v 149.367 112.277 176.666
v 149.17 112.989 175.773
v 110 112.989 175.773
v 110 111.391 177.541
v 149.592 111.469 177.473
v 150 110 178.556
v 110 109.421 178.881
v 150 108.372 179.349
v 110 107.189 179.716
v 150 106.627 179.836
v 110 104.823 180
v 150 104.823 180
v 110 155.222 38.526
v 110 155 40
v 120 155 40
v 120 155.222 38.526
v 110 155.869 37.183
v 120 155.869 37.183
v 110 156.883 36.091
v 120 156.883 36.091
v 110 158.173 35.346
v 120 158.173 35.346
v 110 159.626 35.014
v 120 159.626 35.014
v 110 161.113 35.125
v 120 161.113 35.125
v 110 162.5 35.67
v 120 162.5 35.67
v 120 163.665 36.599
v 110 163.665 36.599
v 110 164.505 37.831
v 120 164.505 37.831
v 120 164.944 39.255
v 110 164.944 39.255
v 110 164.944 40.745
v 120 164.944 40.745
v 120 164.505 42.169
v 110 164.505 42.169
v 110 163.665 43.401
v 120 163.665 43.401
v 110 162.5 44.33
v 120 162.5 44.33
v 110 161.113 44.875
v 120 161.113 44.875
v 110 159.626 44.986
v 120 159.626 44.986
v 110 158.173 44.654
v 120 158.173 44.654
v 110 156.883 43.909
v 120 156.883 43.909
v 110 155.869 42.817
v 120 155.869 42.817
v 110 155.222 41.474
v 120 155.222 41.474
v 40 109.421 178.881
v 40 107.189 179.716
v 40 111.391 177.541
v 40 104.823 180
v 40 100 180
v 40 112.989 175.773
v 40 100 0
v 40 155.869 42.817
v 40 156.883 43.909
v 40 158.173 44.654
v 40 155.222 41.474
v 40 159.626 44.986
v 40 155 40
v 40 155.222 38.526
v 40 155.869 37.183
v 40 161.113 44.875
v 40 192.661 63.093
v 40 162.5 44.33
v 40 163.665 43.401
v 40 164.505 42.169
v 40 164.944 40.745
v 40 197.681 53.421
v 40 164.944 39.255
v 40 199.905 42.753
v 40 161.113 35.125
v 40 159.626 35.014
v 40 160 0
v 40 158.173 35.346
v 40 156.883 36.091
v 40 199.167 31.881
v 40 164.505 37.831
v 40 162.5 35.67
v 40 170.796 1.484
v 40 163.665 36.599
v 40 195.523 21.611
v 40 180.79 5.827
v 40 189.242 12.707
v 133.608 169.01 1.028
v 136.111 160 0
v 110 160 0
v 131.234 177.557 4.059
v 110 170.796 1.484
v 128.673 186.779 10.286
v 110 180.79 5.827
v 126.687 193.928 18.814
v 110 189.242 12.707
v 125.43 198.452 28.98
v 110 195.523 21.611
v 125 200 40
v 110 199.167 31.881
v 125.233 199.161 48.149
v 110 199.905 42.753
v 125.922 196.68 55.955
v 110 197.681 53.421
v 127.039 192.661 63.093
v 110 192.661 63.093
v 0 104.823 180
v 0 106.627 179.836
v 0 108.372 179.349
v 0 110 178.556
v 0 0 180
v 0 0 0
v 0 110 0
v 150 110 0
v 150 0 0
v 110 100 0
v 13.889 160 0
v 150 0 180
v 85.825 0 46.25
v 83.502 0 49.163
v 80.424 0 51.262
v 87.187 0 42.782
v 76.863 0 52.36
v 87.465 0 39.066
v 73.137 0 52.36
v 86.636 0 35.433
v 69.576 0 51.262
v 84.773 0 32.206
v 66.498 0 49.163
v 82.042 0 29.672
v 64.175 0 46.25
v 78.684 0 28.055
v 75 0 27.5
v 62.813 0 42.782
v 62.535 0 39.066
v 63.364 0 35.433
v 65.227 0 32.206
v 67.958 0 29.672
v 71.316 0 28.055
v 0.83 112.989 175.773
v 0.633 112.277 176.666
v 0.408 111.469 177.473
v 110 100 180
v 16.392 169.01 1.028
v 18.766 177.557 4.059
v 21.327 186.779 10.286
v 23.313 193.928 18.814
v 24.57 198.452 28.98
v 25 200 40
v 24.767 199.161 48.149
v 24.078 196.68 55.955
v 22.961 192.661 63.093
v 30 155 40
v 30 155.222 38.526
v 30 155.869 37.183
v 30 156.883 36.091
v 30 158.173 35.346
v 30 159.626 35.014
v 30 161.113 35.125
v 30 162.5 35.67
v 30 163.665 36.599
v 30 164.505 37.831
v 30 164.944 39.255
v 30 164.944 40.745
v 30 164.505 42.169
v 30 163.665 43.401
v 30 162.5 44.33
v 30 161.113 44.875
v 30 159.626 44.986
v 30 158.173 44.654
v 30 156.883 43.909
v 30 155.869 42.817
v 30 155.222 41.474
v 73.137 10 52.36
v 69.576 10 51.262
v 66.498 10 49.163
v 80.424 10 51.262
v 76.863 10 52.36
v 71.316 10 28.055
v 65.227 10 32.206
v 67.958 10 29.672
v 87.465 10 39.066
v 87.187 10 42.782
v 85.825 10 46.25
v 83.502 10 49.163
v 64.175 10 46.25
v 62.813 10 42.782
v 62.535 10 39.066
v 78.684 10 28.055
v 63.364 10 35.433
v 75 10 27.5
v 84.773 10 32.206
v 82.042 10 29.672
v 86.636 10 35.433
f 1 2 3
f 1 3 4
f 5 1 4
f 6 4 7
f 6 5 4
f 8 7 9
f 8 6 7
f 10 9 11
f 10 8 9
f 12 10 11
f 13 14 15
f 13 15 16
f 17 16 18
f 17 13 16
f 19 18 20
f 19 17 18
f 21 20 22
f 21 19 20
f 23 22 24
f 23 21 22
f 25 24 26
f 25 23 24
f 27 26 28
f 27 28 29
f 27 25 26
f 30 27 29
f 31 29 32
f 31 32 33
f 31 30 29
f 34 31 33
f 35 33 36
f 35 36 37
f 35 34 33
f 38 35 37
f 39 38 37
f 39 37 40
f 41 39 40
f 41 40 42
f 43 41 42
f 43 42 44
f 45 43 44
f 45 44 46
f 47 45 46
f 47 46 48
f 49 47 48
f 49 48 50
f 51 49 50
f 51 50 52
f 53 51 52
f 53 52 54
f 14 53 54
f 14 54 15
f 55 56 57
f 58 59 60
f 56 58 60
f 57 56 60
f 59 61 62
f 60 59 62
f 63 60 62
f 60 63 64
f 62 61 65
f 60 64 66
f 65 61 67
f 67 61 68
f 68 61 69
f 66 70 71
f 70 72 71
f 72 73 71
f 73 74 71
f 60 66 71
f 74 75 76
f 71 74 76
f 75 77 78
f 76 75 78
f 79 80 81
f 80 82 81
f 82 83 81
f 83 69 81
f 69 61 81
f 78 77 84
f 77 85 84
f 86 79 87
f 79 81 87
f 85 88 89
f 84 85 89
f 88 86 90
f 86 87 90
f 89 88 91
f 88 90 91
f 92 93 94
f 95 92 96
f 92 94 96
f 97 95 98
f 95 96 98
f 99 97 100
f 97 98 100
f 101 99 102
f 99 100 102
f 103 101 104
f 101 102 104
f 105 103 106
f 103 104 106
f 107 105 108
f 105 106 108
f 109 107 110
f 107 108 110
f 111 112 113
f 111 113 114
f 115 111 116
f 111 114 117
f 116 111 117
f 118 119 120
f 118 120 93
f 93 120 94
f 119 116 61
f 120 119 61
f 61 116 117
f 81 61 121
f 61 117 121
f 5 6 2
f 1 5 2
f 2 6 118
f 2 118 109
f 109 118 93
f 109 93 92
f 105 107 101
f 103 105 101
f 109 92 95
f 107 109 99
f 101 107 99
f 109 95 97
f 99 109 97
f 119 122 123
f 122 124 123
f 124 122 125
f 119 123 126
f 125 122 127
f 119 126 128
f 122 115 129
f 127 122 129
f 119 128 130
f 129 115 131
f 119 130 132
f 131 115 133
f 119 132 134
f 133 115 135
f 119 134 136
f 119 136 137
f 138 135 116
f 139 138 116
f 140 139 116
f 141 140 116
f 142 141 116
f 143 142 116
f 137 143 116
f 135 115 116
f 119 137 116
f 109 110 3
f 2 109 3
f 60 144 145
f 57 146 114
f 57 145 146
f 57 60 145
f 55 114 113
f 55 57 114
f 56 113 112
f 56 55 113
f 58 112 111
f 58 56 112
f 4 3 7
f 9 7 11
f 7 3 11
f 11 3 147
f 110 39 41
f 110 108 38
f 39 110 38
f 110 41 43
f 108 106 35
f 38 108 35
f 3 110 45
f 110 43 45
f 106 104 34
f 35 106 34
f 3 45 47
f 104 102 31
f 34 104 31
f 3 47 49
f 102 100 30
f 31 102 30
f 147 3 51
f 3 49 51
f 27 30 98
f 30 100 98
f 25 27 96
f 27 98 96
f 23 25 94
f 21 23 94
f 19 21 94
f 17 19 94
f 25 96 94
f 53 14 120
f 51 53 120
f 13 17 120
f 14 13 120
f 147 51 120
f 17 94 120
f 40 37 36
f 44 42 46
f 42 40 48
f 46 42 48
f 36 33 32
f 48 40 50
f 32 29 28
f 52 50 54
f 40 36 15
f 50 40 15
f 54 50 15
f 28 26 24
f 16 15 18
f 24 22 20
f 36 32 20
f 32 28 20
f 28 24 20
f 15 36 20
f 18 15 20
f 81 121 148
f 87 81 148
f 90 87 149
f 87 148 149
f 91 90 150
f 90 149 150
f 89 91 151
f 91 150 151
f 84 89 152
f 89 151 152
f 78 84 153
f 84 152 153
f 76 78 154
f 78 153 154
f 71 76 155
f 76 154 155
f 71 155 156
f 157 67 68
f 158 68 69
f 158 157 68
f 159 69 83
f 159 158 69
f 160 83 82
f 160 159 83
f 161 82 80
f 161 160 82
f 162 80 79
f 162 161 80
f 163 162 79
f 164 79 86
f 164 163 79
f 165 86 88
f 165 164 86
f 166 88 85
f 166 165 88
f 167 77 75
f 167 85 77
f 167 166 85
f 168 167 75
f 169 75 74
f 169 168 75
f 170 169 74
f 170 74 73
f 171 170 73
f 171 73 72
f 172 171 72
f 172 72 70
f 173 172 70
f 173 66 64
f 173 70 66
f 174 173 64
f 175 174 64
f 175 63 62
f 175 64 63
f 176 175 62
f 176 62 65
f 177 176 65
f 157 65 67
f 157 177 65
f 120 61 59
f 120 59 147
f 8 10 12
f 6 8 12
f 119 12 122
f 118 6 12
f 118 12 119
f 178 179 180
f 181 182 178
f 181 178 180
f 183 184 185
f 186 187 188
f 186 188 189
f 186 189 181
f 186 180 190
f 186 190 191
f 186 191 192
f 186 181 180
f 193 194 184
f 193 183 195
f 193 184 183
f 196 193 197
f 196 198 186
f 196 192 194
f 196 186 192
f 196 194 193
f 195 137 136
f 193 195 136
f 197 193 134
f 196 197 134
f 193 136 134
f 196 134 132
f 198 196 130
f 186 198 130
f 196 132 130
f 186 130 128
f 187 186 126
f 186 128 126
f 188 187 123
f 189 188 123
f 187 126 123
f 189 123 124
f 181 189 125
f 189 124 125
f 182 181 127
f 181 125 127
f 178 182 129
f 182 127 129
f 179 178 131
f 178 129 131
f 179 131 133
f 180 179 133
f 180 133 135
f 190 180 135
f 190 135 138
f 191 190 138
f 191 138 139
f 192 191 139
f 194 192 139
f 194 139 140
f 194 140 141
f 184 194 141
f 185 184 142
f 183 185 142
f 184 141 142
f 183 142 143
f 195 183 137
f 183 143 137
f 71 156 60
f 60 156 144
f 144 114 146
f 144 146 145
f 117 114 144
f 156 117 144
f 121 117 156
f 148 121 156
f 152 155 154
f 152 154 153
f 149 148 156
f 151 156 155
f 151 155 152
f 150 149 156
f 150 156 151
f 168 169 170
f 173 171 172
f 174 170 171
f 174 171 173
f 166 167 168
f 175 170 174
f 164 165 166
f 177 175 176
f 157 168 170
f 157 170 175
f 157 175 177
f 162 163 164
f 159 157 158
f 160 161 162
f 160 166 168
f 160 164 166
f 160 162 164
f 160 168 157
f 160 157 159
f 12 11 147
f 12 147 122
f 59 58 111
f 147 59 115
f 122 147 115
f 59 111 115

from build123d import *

# Parameters (mm, degrees)
EXTRUDE_1_DEPTH         = 150
FILLET_1_R              = 10
CUT_EXTRUDE_1_DEPTH     = 309.058436015
SKETCH1_R               = 12.5
CUT_EXTRUDE1_DEPTH      = 10
CUT_EXTRUDE2_DEPTH      = 80
CUT_EXTRUDE2_DEPTH_BACK = 10
SKETCH2_R               = 5


with BuildPart() as part:
    # 草圖1 → 填料-伸長1 (new body)
    with BuildSketch(Plane(origin=(0, 0, 0), x_dir=(0, 0, -1), z_dir=(1, 0, 0))):
        with BuildLine():
            Line((0, 0), (0, 160))
            ThreePointArc((0, 160), (-21.611444176, 195.522683101), (-63.093050736, 192.660542061))
            Line((-63.093050736, 192.660542061), (-180, 110))
            Line((-180, 110), (-180, 0))
            Line((-180, 0), (0, 0))
        make_face()
    extrude(amount=EXTRUDE_1_DEPTH)

    # 圓角1
    fillet_1_edges = [part.edges().sort_by_distance(p)[0] for p in [
        (75, 110, 180),
    ]]
    fillet(fillet_1_edges, radius=FILLET_1_R)

    # 草圖2 → 除料-伸長1 (cut, through all)
    with BuildSketch(Plane(origin=(0, 0, 0), x_dir=(-1, 0, 0), z_dir=(0, 0, -1))):
        Polygon((-150, 110), (-125, 200), (-125, 212.317241835), (-176.077029544, 212.317241835), (-176.077029544, 111.407234288), align=None)
        Polygon((-110, 110), (-110, 202.916849344), (-40, 202.916849344), (-40, 110), (-40, 100), (-110, 100), align=None)
        Polygon((26.077029544, 111.407234288), (0, 110), (-25, 200), (-25, 212.317241835), (26.077029544, 212.317241835), align=None)
    extrude(amount=-CUT_EXTRUDE_1_DEPTH, mode=Mode.SUBTRACT)

    # Sketch1 → Cut-Extrude1 (cut)
    with BuildSketch(Plane.XZ):
        with Locations(Location((75, 40, 0), (0, 0, 270))):
            Circle(SKETCH1_R)
    extrude(amount=-CUT_EXTRUDE1_DEPTH, mode=Mode.SUBTRACT)

    # Sketch2 → Cut-Extrude2 (cut, two sides: drawn at the far end of the back side and taken through both)
    with BuildSketch(Plane(origin=(40, 0, 0), x_dir=(0, 0, -1), z_dir=(1, 0, 0)).offset(-CUT_EXTRUDE2_DEPTH_BACK)):
        with Locations(Location((-40, 160, 0), (0, 0, 270))):
            Circle(SKETCH2_R)
    extrude(amount=CUT_EXTRUDE2_DEPTH + CUT_EXTRUDE2_DEPTH_BACK, mode=Mode.SUBTRACT)


solid = part.part
